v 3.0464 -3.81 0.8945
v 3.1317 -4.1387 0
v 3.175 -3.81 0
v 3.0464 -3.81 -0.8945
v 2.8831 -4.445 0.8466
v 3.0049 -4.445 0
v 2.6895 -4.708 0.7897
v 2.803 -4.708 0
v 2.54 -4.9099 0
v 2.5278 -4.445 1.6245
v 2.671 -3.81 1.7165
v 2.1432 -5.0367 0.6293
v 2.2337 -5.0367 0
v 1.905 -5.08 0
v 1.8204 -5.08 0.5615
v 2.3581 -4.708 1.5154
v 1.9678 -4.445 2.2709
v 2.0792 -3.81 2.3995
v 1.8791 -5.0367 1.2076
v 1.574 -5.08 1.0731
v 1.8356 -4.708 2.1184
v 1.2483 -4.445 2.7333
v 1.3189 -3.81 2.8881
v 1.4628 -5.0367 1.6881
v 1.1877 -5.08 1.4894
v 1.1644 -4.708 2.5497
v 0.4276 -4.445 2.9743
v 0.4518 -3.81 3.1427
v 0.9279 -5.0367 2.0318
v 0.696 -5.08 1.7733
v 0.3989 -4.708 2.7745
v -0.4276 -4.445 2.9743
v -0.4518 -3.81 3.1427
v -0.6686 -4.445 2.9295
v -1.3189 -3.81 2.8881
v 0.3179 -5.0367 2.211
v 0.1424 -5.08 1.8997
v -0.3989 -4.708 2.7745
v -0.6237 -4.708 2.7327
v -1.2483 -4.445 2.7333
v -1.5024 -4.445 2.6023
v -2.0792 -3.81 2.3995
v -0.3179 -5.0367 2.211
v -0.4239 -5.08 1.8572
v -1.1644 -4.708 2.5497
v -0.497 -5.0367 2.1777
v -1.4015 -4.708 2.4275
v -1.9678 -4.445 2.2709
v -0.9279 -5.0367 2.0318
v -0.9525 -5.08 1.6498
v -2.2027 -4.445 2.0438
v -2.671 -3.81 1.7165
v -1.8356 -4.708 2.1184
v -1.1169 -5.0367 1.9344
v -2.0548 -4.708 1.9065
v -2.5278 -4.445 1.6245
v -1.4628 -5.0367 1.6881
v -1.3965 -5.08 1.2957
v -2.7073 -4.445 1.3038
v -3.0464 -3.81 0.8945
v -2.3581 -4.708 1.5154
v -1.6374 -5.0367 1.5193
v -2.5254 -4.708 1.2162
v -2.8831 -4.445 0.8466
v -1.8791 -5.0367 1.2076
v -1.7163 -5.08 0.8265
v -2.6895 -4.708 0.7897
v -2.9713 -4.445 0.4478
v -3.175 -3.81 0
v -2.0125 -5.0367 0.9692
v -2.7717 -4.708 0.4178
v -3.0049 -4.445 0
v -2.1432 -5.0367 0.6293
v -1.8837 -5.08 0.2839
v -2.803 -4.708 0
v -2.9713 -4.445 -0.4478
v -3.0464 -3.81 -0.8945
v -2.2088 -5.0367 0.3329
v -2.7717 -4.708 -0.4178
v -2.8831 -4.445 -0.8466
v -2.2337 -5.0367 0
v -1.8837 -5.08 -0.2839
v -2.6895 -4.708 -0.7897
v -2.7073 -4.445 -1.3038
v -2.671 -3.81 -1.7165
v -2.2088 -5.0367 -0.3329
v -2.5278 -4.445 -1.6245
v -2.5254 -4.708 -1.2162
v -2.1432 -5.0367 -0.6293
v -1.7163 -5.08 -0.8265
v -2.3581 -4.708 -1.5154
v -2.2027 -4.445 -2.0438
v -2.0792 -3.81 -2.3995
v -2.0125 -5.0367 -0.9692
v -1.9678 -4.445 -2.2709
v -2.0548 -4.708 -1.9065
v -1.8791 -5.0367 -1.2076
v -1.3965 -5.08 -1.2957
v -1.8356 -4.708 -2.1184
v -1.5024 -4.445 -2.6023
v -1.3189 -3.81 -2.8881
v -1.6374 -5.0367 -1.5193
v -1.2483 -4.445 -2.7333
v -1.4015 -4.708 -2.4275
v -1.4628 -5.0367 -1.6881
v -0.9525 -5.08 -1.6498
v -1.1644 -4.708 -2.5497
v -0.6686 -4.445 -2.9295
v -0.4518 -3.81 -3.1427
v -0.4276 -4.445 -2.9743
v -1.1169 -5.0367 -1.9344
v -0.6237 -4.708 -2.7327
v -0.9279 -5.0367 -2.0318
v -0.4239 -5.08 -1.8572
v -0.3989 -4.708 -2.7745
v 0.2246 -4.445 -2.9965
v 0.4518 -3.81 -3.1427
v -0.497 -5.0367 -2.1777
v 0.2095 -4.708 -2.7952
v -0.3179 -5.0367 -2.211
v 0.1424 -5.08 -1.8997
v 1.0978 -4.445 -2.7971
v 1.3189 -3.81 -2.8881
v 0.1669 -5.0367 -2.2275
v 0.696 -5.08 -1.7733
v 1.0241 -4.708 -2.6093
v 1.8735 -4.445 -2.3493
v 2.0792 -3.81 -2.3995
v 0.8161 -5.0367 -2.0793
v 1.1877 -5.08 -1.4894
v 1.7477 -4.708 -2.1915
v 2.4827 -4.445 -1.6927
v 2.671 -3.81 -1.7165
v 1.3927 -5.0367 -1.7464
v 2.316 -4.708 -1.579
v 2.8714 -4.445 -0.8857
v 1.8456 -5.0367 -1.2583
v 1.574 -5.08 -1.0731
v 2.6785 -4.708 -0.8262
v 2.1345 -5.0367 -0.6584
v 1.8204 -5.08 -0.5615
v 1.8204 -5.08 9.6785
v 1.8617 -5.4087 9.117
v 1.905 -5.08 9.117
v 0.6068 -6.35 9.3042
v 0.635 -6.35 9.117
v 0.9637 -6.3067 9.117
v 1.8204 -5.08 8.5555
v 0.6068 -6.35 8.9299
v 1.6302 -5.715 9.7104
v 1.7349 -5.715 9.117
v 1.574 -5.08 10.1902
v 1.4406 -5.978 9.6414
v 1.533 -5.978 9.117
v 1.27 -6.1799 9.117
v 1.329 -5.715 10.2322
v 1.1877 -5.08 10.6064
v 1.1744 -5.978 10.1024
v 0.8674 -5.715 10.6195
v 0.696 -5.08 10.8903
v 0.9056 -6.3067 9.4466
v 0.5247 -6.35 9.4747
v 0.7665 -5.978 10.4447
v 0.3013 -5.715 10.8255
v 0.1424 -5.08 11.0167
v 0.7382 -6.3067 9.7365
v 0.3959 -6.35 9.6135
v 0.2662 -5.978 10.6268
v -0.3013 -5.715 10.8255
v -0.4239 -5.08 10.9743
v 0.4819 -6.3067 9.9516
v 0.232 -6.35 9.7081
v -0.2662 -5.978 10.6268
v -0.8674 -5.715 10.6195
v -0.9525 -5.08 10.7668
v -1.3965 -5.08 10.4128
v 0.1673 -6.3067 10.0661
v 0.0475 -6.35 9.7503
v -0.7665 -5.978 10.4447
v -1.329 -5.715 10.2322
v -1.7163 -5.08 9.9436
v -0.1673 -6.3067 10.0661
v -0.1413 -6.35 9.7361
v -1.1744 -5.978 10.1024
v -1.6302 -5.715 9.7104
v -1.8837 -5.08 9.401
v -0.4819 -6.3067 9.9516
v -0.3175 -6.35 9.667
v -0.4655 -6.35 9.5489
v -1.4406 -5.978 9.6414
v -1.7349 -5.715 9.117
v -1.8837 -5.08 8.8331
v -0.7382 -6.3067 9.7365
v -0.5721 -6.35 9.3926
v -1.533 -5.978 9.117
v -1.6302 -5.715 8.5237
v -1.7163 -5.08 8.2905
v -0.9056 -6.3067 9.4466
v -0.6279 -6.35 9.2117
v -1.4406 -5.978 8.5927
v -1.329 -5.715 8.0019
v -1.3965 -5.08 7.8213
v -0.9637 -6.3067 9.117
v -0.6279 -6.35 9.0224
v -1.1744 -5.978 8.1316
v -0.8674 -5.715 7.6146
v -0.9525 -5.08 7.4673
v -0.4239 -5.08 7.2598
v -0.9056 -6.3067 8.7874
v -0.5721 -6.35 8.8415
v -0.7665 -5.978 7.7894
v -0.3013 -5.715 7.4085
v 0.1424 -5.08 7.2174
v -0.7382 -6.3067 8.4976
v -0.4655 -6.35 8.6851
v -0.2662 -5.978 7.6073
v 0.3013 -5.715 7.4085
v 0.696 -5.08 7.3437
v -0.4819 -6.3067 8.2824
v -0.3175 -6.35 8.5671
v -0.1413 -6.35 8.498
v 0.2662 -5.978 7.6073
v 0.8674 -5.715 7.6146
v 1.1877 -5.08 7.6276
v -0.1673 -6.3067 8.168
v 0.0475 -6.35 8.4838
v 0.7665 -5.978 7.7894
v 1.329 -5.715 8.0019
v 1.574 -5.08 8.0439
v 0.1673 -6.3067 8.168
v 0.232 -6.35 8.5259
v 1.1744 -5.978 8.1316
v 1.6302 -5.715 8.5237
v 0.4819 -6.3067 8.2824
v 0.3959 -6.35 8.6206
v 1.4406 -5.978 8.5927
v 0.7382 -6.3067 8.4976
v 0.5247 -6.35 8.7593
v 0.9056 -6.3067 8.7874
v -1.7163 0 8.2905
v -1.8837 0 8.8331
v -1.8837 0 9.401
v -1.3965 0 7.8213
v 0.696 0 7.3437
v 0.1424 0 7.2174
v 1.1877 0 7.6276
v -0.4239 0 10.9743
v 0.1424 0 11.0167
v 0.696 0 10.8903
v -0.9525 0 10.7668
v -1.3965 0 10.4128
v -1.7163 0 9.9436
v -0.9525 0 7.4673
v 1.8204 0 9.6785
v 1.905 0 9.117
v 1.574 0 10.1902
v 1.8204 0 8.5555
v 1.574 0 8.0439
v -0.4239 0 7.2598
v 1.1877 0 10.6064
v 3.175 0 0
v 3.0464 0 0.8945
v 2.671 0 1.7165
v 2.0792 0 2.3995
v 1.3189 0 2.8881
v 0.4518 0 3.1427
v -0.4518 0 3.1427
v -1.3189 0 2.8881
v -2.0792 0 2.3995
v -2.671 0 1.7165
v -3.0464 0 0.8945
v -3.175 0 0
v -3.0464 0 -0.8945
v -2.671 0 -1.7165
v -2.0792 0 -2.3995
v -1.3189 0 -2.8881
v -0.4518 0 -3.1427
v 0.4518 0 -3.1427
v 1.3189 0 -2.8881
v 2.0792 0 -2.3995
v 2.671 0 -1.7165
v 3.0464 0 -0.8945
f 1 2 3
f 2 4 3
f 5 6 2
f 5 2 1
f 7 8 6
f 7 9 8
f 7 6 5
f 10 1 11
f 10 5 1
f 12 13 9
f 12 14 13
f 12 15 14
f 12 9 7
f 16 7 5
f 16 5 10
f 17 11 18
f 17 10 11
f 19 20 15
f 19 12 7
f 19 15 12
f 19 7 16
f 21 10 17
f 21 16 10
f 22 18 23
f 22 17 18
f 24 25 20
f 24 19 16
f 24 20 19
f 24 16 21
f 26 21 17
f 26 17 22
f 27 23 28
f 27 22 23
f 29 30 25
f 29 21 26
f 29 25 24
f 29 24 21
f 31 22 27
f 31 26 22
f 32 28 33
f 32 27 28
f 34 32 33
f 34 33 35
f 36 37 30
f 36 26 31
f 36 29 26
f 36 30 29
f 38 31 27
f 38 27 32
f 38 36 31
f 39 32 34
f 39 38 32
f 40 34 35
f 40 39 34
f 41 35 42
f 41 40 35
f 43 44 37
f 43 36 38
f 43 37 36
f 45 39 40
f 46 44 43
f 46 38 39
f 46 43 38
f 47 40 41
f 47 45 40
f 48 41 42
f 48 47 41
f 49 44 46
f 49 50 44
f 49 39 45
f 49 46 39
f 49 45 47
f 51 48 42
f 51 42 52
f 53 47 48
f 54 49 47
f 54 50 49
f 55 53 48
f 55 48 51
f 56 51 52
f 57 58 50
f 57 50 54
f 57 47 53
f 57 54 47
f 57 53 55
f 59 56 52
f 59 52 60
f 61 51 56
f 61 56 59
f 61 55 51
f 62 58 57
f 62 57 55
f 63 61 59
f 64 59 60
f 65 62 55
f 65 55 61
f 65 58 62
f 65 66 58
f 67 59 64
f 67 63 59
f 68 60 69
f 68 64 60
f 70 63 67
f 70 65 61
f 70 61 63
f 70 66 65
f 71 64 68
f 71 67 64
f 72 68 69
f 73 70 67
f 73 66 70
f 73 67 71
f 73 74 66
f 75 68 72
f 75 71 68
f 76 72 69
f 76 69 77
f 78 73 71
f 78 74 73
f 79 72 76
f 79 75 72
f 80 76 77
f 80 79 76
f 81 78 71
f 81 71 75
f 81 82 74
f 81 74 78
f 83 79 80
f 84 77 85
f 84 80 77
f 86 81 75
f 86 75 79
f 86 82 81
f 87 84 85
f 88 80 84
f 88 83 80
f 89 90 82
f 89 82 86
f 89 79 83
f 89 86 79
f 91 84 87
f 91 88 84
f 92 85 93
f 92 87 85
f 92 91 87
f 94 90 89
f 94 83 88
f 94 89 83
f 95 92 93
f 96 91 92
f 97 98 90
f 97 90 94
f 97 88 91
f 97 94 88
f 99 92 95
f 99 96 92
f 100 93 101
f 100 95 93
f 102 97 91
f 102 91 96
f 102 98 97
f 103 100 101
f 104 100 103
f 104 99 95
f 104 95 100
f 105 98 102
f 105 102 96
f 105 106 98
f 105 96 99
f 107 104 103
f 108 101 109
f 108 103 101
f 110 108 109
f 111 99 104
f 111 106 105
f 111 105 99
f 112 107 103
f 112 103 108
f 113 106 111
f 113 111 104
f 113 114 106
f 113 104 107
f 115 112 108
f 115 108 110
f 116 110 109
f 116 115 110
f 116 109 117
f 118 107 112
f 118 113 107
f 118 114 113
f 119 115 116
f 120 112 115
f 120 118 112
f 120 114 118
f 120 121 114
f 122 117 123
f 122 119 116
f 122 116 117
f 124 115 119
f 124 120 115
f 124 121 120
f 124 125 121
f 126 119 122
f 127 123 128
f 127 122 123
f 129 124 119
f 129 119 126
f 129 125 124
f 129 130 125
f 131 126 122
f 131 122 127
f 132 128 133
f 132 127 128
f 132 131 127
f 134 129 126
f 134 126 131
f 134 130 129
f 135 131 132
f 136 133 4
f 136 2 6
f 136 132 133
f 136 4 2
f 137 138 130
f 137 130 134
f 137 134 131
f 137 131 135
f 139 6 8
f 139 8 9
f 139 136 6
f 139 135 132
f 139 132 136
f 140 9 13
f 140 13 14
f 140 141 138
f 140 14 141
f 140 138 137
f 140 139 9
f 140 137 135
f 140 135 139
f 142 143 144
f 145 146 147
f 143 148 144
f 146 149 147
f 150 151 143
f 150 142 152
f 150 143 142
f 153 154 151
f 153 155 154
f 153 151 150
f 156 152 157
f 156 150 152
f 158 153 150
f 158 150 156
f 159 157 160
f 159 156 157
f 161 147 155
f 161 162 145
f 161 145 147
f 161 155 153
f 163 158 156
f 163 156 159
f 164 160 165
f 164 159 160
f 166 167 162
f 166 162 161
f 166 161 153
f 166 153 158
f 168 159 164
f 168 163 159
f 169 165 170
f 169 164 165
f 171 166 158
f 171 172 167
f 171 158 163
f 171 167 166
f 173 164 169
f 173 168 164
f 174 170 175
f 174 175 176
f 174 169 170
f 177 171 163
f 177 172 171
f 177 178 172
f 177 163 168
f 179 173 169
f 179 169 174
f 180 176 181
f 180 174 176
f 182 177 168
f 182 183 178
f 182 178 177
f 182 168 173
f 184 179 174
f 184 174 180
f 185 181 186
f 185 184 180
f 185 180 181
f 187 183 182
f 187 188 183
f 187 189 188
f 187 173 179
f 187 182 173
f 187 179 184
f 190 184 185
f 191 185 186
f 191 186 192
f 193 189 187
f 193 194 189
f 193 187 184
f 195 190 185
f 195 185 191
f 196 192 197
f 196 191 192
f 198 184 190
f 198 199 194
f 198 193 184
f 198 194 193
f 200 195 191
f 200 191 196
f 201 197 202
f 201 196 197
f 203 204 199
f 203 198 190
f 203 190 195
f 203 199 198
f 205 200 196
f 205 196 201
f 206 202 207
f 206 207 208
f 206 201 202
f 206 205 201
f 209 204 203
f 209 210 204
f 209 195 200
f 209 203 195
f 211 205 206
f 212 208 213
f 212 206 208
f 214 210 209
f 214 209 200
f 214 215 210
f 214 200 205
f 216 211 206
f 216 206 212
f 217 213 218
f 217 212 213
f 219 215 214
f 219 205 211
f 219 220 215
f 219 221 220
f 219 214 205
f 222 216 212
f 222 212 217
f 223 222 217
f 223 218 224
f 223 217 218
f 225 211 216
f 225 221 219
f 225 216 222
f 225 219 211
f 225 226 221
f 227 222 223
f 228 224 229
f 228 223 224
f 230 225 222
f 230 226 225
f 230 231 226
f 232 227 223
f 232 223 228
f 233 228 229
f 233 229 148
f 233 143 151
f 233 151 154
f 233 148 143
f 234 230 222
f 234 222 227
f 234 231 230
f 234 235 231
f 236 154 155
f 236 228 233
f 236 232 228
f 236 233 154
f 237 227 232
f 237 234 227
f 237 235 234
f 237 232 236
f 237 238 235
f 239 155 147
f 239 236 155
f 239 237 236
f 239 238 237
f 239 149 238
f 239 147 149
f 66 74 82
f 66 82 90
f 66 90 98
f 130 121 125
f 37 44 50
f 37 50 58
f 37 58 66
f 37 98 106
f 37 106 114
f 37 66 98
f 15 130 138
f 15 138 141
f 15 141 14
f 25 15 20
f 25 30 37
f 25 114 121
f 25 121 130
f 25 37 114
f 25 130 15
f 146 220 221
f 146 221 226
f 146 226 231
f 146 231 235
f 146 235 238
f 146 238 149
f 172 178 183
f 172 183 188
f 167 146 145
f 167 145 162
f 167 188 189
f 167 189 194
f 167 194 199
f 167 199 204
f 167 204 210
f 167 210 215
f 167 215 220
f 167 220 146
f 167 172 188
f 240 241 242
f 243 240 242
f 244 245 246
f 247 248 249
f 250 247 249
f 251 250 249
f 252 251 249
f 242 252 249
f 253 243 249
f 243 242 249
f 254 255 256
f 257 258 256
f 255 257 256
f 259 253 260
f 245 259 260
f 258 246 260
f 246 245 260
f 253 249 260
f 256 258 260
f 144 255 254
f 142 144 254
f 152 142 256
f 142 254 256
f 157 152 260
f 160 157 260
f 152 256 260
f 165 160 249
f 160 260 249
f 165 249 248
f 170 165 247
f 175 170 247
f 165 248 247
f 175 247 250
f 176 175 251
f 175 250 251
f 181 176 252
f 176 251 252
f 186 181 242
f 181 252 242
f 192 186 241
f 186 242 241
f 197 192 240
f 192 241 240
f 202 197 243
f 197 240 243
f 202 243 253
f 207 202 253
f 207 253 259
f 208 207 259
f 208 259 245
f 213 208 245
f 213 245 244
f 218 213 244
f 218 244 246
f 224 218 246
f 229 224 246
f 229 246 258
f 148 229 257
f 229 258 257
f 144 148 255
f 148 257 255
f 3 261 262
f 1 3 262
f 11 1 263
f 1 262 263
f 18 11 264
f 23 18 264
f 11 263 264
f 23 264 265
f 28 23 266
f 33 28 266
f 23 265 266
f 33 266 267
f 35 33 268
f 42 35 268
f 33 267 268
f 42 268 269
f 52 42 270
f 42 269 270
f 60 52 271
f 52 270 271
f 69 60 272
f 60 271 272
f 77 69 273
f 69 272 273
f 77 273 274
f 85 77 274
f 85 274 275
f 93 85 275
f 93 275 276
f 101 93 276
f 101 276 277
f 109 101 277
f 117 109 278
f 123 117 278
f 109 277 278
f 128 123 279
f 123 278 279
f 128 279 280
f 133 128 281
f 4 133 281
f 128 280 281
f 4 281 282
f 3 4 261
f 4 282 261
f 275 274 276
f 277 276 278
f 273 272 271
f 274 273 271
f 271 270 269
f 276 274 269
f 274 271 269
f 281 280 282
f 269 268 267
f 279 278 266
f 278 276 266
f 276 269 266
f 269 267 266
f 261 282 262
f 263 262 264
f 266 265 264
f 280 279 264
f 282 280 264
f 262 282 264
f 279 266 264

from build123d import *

# Parameters (mm, degrees)
F0_R     = 3.175
F1_DEPTH = 5.08
F2_R     = 1.27
F3_R     = 1.905
F4_DEPTH = 6.35
F5_R     = 1.27


with BuildPart() as f1:
    # F0 (on Front) → F1 (new body)
    with BuildSketch(Plane.XZ):
        Circle(F0_R)
    extrude(amount=F1_DEPTH)

    # F2
    f2_edges = [f1.edges().sort_by_distance(p)[0] for p in [
        (-3.175, -5.08, 0),
    ]]
    fillet(f2_edges, radius=F2_R)


with BuildPart() as f4:
    # F3 (on Front) → F4 (new body)
    with BuildSketch(Plane.XZ):
        with Locations((0, 9.117034)):
            Circle(F3_R)
    extrude(amount=F4_DEPTH)

    # F5
    f5_edges = [f4.edges().sort_by_distance(p)[0] for p in [
        (-1.905, -6.35, 9.117034),
    ]]
    fillet(f5_edges, radius=F5_R)


solid = Compound([f1.part, f4.part])
